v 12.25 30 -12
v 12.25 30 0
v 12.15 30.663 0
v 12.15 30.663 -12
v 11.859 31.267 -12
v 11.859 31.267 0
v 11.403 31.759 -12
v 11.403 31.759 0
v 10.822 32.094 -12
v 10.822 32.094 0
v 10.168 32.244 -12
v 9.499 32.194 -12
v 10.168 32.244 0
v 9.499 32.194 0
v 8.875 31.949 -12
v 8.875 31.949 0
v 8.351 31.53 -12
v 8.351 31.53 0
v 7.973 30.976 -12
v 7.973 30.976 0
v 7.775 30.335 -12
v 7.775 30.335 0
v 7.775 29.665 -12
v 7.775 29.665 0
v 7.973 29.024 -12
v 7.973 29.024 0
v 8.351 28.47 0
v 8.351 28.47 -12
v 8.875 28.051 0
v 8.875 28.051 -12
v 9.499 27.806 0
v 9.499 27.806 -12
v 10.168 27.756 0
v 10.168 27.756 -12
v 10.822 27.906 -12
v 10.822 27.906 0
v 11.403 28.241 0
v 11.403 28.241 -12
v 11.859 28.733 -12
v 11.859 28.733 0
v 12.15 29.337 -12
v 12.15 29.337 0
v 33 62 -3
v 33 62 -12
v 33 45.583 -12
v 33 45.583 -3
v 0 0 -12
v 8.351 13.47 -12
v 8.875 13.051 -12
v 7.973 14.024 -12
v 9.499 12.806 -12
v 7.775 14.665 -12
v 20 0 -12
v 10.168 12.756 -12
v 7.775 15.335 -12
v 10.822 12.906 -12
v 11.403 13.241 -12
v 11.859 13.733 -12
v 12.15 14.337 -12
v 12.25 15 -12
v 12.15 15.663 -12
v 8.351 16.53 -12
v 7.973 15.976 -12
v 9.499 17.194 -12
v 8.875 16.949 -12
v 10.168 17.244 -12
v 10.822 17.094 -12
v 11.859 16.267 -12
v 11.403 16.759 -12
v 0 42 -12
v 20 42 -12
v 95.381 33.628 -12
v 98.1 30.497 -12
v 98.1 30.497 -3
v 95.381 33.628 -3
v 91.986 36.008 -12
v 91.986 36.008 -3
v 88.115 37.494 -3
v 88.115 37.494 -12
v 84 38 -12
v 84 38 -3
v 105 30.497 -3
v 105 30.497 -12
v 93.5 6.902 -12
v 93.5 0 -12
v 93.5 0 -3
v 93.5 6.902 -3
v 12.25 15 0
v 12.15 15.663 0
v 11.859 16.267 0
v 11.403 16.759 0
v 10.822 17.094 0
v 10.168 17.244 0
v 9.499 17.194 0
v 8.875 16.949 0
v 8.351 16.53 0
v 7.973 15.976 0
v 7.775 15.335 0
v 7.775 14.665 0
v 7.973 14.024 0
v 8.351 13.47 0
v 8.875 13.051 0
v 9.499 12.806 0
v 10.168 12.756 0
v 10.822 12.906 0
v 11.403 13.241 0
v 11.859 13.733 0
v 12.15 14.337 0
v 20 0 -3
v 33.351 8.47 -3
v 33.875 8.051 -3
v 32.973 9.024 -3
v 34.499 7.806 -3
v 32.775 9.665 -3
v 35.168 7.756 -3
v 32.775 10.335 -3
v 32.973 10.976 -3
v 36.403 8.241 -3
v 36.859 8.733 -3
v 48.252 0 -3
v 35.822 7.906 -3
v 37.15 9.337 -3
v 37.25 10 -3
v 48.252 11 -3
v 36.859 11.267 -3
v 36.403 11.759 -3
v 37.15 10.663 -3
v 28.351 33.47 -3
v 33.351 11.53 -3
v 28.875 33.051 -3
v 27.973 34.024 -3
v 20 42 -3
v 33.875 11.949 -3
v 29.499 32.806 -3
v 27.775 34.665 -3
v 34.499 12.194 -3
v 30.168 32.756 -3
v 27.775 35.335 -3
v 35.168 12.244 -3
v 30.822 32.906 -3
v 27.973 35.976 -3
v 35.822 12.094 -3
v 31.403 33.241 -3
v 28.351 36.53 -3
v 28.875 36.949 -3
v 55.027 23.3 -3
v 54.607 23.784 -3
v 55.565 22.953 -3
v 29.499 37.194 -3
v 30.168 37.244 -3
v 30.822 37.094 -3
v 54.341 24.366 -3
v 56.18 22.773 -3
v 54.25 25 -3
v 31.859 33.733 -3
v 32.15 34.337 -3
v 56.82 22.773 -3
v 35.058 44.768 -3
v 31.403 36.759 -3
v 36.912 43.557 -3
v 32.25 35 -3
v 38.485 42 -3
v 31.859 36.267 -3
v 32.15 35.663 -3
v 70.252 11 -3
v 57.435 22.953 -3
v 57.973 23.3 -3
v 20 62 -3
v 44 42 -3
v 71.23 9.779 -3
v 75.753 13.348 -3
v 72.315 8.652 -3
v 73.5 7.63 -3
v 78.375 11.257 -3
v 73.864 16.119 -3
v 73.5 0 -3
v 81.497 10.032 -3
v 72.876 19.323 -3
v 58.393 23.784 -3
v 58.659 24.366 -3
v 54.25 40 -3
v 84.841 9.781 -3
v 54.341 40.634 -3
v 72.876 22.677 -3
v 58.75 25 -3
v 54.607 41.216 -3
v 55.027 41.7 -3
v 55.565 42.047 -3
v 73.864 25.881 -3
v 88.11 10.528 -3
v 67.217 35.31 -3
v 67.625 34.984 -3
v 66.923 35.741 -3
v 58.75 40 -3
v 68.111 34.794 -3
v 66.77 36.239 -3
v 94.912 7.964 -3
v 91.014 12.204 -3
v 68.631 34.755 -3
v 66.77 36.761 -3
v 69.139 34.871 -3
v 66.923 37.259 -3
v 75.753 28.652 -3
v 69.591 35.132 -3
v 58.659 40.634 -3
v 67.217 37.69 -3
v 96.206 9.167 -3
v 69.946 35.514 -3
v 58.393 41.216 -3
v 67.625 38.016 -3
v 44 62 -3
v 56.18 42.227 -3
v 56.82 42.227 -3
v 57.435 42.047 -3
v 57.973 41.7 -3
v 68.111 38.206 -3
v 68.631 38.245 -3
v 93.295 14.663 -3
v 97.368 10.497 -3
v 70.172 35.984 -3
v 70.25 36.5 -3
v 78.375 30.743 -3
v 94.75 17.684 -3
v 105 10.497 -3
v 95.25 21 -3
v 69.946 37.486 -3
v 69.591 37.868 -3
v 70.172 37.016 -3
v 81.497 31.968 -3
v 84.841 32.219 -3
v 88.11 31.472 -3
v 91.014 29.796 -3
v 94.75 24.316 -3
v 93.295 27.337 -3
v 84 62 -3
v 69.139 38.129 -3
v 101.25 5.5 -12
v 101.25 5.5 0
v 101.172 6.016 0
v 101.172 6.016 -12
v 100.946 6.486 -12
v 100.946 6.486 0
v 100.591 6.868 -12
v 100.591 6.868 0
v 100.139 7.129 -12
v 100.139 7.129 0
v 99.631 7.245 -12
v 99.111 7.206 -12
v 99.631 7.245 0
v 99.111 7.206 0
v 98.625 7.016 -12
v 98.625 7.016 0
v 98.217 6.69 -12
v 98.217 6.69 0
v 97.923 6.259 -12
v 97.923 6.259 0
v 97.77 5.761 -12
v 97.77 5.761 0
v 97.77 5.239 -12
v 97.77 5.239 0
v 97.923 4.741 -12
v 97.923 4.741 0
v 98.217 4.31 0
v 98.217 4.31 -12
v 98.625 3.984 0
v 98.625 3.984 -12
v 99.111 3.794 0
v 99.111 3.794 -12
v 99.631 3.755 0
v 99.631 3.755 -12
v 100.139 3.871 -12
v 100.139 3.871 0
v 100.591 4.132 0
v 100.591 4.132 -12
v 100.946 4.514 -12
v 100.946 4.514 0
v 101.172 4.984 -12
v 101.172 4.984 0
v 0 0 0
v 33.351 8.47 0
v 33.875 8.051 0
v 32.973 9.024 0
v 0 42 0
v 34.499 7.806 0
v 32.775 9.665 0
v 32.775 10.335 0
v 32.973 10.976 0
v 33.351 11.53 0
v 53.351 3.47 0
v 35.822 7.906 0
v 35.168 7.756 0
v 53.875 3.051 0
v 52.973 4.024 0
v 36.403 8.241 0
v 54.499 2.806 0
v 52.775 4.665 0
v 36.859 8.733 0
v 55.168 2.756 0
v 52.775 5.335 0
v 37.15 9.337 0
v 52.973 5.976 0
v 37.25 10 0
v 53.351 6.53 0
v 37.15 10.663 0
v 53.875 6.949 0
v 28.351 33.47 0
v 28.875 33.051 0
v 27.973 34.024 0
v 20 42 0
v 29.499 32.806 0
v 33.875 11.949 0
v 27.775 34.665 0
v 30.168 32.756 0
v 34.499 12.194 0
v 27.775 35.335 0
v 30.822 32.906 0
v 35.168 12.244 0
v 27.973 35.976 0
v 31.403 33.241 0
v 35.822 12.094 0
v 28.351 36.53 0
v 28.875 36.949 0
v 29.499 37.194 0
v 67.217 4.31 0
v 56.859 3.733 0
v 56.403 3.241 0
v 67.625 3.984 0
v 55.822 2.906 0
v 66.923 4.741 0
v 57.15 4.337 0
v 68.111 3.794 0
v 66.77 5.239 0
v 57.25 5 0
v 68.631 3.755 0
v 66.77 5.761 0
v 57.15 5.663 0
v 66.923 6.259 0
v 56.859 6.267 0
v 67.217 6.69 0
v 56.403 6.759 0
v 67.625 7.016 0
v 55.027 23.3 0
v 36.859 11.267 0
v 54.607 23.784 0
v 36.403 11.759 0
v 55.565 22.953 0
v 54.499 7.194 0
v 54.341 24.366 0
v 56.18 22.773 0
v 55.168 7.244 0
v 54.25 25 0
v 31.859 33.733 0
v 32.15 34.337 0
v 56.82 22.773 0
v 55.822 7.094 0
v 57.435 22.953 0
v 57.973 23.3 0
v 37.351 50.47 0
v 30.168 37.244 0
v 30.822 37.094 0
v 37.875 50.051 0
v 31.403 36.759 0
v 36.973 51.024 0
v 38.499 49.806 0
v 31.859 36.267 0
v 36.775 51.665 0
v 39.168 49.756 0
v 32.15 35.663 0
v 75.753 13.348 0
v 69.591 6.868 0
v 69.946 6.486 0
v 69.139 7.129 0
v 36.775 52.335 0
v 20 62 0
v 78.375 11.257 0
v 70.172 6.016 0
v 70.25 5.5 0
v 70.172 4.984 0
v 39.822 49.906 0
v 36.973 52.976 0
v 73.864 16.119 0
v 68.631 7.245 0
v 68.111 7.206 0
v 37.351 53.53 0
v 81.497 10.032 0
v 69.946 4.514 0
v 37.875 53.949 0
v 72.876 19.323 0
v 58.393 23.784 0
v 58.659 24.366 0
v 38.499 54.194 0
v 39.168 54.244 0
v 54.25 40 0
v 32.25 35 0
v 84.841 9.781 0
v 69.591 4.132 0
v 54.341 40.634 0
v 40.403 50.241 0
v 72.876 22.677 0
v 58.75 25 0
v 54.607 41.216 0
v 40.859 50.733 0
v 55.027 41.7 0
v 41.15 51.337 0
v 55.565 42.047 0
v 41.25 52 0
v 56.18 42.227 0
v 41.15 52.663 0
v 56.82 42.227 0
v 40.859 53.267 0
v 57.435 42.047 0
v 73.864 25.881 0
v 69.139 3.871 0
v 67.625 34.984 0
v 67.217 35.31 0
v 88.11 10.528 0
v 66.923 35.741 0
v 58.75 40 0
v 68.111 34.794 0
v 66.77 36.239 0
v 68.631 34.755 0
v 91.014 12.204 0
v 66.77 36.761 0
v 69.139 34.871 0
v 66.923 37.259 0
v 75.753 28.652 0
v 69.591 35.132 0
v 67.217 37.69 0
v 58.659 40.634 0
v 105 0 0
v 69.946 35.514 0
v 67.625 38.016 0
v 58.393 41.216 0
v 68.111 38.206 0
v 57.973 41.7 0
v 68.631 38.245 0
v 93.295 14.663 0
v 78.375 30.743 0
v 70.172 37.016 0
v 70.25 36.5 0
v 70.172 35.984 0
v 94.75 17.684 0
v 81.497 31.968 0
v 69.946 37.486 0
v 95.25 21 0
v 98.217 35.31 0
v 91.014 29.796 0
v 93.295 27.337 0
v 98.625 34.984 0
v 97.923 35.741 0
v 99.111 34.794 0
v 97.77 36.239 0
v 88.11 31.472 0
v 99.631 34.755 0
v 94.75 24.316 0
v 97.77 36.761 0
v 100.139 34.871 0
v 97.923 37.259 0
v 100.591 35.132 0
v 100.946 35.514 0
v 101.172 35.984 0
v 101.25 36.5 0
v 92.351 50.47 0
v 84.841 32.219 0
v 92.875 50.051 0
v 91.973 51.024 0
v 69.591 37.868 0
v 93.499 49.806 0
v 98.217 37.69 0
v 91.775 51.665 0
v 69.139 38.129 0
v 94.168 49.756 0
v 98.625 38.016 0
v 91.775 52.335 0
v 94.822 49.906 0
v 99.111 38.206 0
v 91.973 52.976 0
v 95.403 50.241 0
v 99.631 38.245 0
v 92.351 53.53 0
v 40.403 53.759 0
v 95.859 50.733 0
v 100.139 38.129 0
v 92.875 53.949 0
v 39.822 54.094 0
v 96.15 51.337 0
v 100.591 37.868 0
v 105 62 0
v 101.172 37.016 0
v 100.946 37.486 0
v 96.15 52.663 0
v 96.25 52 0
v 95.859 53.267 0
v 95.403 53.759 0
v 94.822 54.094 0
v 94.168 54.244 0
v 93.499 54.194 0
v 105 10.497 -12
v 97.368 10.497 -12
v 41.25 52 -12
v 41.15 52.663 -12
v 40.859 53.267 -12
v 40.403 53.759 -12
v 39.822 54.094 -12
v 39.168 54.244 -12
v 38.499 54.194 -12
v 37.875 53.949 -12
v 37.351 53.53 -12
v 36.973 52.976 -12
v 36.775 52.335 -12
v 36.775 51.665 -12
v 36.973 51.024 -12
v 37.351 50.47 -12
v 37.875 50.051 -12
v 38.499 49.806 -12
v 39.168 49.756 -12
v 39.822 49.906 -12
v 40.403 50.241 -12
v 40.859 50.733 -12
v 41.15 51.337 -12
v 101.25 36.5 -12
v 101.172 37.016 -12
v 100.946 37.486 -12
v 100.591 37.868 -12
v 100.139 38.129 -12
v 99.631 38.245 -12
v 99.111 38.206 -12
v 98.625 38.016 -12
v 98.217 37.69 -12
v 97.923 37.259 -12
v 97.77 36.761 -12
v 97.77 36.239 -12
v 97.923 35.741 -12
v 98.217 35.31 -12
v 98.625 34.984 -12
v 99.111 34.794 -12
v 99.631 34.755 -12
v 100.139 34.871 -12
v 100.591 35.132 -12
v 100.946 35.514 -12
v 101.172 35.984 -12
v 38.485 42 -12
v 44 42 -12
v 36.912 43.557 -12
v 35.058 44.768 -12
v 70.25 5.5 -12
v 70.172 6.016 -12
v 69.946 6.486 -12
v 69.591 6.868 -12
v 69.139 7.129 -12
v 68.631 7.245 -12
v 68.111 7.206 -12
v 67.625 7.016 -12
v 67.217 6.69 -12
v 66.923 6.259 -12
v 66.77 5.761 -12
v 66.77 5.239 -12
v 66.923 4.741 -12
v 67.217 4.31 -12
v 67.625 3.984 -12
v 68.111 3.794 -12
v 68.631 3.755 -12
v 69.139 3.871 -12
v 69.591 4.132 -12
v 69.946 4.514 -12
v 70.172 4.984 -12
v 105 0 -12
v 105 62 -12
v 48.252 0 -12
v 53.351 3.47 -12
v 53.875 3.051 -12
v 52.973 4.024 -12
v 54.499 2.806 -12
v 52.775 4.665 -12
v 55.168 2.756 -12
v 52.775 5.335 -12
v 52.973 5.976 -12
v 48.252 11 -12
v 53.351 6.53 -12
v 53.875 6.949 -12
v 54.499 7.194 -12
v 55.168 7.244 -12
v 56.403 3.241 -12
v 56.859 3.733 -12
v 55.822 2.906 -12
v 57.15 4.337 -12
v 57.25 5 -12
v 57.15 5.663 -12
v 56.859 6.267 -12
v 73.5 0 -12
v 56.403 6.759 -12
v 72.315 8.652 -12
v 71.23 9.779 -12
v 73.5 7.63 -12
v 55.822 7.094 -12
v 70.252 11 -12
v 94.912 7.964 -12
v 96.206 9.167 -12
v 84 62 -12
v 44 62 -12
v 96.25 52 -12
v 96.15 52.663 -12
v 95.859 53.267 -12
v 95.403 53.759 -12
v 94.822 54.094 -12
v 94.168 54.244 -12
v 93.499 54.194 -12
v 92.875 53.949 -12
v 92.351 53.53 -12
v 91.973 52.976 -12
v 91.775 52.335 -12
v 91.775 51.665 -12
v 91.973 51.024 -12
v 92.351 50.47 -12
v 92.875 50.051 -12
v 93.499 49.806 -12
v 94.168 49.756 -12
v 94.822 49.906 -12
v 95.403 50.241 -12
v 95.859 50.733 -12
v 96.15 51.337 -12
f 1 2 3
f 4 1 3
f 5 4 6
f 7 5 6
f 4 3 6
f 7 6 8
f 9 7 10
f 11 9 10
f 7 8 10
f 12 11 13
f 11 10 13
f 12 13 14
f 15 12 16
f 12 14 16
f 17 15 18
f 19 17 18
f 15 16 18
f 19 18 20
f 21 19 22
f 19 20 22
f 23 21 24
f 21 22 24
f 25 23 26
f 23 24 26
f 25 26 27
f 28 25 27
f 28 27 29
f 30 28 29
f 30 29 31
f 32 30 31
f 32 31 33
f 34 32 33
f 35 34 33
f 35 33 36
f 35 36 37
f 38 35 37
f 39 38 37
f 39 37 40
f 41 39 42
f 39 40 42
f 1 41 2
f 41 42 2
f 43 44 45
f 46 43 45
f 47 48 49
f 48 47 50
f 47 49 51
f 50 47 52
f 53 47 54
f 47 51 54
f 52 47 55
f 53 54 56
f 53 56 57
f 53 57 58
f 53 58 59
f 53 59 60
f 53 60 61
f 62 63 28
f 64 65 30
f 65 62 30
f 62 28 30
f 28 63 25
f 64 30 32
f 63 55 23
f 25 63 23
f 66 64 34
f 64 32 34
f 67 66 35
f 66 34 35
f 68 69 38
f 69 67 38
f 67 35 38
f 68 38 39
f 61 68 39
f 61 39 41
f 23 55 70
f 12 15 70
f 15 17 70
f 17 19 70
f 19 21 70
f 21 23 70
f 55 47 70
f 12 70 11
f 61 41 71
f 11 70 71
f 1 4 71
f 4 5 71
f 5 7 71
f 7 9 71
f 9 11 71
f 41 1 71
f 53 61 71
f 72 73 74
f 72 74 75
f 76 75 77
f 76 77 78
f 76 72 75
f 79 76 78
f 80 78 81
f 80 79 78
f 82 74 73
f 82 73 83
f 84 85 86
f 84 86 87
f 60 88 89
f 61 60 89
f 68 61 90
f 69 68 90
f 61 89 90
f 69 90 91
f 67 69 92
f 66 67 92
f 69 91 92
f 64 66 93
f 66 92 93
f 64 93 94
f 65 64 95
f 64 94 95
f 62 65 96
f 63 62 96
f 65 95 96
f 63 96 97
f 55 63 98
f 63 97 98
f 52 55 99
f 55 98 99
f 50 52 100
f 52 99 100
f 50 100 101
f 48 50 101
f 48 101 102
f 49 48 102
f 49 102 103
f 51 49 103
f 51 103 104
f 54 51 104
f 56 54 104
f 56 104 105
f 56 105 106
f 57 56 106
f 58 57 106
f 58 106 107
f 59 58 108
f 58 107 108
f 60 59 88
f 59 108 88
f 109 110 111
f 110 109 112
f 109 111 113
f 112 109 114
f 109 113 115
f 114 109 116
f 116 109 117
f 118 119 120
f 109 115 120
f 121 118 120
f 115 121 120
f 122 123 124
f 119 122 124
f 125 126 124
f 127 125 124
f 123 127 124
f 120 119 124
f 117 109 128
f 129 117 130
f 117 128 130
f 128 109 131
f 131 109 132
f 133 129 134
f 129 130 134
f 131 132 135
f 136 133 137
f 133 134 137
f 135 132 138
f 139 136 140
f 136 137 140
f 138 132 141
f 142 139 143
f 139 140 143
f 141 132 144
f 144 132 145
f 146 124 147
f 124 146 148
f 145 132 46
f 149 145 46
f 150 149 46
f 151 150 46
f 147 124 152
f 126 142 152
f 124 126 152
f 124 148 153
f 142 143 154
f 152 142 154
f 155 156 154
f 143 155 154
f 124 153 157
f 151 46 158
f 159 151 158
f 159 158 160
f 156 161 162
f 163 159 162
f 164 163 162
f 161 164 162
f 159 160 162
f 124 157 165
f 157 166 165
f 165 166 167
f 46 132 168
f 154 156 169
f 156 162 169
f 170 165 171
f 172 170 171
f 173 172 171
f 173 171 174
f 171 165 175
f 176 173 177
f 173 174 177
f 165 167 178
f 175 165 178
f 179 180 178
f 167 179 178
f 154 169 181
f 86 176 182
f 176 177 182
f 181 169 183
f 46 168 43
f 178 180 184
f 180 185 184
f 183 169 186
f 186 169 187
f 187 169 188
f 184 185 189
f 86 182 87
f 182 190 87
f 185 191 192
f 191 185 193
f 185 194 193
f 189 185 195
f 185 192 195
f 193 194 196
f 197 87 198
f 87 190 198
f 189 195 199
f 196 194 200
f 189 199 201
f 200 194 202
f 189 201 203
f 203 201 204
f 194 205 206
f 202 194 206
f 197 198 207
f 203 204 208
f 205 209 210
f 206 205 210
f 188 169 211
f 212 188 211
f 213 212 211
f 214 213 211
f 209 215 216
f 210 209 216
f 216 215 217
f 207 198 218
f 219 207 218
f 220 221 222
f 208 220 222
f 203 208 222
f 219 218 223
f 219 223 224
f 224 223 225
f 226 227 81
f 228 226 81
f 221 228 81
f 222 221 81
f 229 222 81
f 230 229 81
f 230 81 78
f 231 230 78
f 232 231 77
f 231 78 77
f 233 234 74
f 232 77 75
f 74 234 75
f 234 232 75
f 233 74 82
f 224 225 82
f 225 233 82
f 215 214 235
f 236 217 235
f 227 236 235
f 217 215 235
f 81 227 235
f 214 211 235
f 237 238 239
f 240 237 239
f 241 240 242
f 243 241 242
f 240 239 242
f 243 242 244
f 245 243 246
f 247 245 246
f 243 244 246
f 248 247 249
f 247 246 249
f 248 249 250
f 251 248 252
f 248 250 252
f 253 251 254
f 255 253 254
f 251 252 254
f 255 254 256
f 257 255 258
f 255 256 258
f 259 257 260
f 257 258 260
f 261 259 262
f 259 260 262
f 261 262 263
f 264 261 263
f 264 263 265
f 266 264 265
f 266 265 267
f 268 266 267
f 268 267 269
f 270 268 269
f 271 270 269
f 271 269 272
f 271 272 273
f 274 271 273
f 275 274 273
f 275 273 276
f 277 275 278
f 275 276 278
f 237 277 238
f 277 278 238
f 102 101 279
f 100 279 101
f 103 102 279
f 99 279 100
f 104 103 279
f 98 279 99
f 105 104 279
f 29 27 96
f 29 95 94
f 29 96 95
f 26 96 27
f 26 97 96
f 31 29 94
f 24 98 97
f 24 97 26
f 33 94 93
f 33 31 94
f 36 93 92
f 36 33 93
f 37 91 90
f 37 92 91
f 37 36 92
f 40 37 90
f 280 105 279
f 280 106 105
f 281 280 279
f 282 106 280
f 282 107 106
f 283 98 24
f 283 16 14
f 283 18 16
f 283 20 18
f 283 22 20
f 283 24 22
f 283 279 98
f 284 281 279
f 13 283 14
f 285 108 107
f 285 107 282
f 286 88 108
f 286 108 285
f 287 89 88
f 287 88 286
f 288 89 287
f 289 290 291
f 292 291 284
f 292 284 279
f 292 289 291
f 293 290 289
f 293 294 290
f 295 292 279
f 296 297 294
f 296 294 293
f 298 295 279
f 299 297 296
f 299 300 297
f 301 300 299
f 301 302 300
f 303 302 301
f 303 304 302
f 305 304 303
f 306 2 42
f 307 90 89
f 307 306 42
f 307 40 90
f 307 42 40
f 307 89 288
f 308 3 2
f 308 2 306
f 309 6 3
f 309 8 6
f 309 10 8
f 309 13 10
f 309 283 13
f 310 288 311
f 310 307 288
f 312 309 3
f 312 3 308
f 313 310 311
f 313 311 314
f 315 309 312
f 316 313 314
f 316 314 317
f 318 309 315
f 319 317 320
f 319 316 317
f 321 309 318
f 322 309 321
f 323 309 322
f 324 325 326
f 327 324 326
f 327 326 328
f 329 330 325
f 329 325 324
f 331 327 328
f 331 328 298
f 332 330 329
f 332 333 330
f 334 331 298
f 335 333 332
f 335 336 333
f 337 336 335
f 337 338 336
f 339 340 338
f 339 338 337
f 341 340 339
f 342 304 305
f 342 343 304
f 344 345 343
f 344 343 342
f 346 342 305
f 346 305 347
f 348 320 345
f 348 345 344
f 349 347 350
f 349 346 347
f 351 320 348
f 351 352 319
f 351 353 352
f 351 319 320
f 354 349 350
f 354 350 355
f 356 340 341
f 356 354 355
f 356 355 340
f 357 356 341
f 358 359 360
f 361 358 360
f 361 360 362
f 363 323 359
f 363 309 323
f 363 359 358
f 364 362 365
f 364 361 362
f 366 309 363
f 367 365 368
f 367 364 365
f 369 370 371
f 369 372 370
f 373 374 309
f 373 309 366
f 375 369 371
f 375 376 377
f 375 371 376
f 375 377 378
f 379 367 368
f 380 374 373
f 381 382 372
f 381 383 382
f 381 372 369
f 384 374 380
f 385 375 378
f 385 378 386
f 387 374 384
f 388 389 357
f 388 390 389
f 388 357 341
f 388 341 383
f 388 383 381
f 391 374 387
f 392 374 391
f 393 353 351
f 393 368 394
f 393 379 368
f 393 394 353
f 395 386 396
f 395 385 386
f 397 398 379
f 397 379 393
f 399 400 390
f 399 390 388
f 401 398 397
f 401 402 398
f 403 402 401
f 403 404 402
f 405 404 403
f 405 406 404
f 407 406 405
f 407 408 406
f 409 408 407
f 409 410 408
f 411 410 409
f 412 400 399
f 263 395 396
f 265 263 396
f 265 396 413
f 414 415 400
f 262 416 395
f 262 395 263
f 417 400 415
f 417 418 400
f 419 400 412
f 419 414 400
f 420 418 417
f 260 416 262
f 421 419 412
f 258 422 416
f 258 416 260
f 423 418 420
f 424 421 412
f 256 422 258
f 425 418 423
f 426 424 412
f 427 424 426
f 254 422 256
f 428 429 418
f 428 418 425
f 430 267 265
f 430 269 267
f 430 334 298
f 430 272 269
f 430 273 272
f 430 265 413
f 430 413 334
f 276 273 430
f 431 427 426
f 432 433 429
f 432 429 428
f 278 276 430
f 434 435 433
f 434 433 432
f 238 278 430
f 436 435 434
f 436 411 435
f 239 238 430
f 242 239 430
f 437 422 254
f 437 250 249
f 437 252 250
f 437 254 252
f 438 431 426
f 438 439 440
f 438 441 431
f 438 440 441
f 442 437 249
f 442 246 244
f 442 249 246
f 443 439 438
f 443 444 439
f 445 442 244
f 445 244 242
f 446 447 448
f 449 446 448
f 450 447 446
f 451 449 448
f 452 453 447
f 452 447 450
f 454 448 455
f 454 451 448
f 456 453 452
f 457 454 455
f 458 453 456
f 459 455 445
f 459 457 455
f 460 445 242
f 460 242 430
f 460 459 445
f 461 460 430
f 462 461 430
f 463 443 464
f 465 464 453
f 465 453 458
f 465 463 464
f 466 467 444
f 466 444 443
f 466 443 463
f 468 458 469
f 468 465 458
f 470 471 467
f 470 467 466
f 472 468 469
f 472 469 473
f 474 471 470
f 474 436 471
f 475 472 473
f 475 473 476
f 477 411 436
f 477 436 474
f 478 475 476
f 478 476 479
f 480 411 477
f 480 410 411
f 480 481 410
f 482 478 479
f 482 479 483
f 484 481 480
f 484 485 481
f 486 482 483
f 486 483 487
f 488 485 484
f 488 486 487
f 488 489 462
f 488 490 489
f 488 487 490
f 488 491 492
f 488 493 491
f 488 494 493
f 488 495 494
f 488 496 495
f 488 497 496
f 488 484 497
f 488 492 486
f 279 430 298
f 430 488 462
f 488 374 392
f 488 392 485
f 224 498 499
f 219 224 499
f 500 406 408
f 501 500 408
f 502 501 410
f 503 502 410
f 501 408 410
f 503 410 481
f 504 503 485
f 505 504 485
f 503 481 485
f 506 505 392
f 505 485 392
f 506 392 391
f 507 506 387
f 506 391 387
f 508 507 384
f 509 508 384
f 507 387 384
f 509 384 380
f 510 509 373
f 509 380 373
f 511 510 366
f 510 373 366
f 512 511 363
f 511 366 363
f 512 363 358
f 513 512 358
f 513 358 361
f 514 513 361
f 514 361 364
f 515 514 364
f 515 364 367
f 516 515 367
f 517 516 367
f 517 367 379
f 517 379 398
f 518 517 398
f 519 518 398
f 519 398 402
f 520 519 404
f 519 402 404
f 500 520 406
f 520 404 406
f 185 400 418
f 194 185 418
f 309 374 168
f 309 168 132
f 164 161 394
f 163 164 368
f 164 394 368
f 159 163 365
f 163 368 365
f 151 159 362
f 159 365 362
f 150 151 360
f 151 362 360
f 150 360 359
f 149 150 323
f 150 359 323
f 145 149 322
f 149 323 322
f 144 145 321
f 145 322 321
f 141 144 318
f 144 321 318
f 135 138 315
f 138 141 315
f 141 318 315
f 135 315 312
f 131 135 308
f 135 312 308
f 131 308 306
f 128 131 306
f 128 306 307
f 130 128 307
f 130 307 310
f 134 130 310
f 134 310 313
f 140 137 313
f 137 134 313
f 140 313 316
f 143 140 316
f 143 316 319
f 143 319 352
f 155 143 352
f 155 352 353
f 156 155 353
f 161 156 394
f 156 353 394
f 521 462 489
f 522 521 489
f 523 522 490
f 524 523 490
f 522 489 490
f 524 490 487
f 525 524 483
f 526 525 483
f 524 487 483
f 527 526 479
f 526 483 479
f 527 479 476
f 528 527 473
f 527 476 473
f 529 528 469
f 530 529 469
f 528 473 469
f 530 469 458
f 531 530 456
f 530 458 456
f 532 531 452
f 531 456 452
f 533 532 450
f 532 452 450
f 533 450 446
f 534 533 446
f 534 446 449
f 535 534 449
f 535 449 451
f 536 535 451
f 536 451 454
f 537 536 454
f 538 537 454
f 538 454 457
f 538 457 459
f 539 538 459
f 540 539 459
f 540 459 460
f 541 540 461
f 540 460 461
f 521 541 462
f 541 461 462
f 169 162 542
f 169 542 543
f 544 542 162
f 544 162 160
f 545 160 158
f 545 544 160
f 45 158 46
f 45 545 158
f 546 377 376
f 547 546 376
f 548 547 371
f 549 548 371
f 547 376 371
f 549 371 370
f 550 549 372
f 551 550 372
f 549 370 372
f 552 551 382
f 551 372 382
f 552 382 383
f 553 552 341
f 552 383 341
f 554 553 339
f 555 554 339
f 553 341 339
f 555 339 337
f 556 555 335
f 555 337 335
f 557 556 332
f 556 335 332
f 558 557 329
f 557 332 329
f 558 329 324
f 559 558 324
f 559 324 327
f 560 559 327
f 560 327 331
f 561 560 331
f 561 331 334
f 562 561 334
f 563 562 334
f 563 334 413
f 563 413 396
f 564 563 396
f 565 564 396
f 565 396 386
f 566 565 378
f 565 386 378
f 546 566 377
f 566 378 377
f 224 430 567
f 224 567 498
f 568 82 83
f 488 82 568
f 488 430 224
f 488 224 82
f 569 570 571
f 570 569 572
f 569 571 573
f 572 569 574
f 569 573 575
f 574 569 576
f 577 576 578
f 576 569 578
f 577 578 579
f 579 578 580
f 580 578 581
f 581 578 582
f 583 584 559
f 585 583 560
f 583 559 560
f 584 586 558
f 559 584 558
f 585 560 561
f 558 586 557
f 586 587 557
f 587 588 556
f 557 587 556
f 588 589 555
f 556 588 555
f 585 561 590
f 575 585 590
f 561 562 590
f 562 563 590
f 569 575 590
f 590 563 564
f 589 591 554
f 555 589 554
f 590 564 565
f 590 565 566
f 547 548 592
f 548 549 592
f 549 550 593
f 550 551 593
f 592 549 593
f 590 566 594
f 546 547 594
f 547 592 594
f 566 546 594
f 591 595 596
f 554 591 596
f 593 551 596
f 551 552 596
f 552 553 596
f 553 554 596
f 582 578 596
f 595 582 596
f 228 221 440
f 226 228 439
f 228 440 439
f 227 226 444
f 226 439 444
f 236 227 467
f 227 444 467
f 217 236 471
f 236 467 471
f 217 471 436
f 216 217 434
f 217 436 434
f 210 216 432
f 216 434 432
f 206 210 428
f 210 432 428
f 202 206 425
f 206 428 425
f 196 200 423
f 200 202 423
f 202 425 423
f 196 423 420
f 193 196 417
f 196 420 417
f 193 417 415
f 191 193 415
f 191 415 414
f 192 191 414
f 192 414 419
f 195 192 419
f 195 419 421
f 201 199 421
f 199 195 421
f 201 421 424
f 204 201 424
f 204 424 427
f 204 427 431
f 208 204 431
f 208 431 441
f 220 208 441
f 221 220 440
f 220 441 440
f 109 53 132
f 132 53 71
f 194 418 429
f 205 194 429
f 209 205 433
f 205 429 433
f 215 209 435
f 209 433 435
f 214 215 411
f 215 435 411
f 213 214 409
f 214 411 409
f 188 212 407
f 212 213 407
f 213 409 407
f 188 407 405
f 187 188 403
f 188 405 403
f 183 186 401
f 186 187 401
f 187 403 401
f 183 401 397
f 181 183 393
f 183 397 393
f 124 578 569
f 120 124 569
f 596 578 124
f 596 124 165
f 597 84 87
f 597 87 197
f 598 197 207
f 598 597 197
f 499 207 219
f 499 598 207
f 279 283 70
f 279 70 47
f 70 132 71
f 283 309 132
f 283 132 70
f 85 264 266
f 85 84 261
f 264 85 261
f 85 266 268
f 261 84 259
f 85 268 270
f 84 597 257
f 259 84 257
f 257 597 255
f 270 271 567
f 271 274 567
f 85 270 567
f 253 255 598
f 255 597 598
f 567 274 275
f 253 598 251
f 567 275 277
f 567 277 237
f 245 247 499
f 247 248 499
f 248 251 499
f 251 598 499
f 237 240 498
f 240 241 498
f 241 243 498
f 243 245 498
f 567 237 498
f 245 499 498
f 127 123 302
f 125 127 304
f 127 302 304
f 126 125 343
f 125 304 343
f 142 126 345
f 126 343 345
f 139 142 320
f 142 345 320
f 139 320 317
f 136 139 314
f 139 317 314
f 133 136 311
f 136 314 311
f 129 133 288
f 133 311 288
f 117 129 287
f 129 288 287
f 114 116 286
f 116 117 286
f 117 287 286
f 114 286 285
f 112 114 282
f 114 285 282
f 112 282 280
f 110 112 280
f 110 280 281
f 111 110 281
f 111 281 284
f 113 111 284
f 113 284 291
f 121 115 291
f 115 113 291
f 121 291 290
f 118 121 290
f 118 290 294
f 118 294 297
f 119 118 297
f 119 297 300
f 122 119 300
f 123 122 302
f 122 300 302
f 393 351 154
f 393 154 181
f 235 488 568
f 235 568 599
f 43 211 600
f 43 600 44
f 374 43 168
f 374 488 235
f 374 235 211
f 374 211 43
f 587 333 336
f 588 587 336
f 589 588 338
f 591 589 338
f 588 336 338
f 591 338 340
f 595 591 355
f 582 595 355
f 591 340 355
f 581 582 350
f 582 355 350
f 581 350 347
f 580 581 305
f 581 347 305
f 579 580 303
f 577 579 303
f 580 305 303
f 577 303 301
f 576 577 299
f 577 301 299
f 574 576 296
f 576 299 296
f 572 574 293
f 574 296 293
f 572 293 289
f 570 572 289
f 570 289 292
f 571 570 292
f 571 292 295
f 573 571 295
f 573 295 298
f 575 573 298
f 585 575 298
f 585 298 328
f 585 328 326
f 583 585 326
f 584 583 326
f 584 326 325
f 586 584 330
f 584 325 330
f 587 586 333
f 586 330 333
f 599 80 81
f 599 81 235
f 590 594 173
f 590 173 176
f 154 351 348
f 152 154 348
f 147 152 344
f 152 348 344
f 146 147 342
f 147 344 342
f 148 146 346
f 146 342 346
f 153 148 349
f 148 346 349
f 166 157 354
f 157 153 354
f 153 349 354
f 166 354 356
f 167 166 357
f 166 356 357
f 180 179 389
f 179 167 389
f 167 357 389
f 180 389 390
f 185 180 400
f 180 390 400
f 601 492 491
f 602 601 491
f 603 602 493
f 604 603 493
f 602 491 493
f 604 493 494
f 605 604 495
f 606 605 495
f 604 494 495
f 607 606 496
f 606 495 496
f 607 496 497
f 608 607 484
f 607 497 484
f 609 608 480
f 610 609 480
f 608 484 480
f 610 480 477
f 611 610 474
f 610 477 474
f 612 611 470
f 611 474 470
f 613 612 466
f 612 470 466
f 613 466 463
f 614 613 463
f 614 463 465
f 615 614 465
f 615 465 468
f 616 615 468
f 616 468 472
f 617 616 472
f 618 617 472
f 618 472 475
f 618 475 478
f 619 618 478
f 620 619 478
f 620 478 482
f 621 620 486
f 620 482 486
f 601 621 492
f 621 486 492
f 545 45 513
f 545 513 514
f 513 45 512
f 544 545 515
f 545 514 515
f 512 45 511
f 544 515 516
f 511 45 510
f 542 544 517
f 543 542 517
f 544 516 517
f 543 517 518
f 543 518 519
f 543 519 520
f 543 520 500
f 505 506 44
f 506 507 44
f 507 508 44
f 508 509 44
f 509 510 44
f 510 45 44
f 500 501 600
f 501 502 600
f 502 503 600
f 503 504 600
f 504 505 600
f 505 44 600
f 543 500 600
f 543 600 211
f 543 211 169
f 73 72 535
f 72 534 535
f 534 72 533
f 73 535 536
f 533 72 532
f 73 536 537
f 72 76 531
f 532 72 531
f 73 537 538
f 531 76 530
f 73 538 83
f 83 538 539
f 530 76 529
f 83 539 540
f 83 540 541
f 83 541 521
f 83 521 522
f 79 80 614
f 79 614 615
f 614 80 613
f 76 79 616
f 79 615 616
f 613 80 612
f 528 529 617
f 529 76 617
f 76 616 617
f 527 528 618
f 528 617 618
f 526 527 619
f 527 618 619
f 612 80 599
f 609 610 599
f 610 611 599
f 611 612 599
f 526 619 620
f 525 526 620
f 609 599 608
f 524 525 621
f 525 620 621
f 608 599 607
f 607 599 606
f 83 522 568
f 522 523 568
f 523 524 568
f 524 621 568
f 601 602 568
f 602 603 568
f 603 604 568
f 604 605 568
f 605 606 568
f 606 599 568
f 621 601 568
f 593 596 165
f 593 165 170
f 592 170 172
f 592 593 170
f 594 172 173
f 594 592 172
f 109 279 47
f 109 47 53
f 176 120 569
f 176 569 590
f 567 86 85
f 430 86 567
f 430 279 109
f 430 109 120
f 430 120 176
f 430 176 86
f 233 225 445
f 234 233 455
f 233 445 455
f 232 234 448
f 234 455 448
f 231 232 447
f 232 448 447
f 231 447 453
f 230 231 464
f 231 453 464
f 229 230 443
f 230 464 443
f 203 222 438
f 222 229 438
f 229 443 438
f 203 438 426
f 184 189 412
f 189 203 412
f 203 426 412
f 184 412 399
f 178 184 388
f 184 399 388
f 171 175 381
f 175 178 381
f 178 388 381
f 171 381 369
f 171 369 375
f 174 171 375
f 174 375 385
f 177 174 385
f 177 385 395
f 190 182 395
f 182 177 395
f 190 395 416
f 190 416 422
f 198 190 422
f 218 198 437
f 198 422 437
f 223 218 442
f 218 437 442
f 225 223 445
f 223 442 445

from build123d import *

# Parameters (mm, degrees)
SKETCH_R     = 2.25
SKETCH_R_2   = 11.25
SKETCH_R_3   = 1.75
PAD_DEPTH    = 12
POCKET_DEPTH = 9


with BuildPart() as pocket_belt_path:
    # Sketch → Pad (new body)
    with BuildSketch(Plane.XY):
        Polygon((0, 0), (105, 0), (105, 62), (20, 62), (20, 42), (0, 42), align=None)
        with Locations((35, 10)):
            Circle(SKETCH_R, mode=Mode.SUBTRACT)
        with Locations((30, 35)):
            Circle(SKETCH_R, mode=Mode.SUBTRACT)
        with Locations((84, 21)):
            Circle(SKETCH_R_2, mode=Mode.SUBTRACT)
        with Locations((68.5, 36.5)):
            Circle(SKETCH_R_3, mode=Mode.SUBTRACT)
        with Locations((99.5, 36.5)):
            Circle(SKETCH_R_3, mode=Mode.SUBTRACT)
        with Locations((68.5, 5.5)):
            Circle(SKETCH_R_3, mode=Mode.SUBTRACT)
        with Locations((99.5, 5.5)):
            Circle(SKETCH_R_3, mode=Mode.SUBTRACT)
        with Locations((10, 30)):
            Circle(SKETCH_R, mode=Mode.SUBTRACT)
        with Locations((10, 15)):
            Circle(SKETCH_R, mode=Mode.SUBTRACT)
        with Locations((39, 52)):
            Circle(SKETCH_R, mode=Mode.SUBTRACT)
        with Locations((94, 52)):
            Circle(SKETCH_R, mode=Mode.SUBTRACT)
        with Locations((55, 5)):
            Circle(SKETCH_R, mode=Mode.SUBTRACT)
        with BuildLine():
            Line((58.75, 25), (58.75, 40))
            ThreePointArc((58.75, 40), (56.5, 42.25), (54.25, 40))
            Line((54.25, 25), (54.25, 40))
            ThreePointArc((54.25, 25), (56.5, 22.75), (58.75, 25))
        make_face(mode=Mode.SUBTRACT)
    extrude(amount=PAD_DEPTH)

    # Sketch001 → Pocket (cut)
    with BuildSketch(Plane.XY.offset(12)):
        with BuildLine():
            ThreePointArc((38.485281, 42), (36.015595, 44.209377), (32.999996, 45.583006))
            Line((32.999996, 67), (32.999996, 45.583006))
            Line((20, 67), (32.999996, 67))
            Line((20, -1), (20, 67))
            Line((20, -1), (48.252269, -1))
            Line((48.252269, 11), (48.252269, -1))
            Line((48.252269, 11), (70.252269, 11))
            ThreePointArc((70.252269, 11), (71.759618, 9.202833), (73.499996, 7.630258))
            Line((73.499996, 7.630258), (73.499996, -1))
            Line((73.499996, -1), (93.499996, -1))
            Line((93.499996, -1), (93.499996, 6.902128))
            ThreePointArc((93.499996, 6.902128), (95.574295, 8.548671), (97.367695, 10.497399))
            Line((105.499996, 10.497399), (97.367695, 10.497399))
            Line((105.499996, 30.497399), (105.499996, 10.497399))
            Line((98.099621, 30.497399), (105.499996, 30.497399))
            ThreePointArc((98.099621, 30.497399), (91.98574, 36.007594), (83.999996, 38))
            Line((83.999996, 38), (83.999996, 67))
            Line((83.999996, 67), (43.999996, 67))
            Line((43.999996, 67), (43.999996, 42))
            Line((38.485281, 42), (43.999996, 42))
        make_face()
    extrude(amount=-POCKET_DEPTH, mode=Mode.SUBTRACT)


with BuildPart() as part_mirroring:
    # Part__Mirroring: instance of Pocket belt path
    add(pocket_belt_path.part.mirror(Plane(origin=(0, 0, 0), x_dir=(0, 1, 0), z_dir=(0, 0, 1))))


solid = part_mirroring.part
